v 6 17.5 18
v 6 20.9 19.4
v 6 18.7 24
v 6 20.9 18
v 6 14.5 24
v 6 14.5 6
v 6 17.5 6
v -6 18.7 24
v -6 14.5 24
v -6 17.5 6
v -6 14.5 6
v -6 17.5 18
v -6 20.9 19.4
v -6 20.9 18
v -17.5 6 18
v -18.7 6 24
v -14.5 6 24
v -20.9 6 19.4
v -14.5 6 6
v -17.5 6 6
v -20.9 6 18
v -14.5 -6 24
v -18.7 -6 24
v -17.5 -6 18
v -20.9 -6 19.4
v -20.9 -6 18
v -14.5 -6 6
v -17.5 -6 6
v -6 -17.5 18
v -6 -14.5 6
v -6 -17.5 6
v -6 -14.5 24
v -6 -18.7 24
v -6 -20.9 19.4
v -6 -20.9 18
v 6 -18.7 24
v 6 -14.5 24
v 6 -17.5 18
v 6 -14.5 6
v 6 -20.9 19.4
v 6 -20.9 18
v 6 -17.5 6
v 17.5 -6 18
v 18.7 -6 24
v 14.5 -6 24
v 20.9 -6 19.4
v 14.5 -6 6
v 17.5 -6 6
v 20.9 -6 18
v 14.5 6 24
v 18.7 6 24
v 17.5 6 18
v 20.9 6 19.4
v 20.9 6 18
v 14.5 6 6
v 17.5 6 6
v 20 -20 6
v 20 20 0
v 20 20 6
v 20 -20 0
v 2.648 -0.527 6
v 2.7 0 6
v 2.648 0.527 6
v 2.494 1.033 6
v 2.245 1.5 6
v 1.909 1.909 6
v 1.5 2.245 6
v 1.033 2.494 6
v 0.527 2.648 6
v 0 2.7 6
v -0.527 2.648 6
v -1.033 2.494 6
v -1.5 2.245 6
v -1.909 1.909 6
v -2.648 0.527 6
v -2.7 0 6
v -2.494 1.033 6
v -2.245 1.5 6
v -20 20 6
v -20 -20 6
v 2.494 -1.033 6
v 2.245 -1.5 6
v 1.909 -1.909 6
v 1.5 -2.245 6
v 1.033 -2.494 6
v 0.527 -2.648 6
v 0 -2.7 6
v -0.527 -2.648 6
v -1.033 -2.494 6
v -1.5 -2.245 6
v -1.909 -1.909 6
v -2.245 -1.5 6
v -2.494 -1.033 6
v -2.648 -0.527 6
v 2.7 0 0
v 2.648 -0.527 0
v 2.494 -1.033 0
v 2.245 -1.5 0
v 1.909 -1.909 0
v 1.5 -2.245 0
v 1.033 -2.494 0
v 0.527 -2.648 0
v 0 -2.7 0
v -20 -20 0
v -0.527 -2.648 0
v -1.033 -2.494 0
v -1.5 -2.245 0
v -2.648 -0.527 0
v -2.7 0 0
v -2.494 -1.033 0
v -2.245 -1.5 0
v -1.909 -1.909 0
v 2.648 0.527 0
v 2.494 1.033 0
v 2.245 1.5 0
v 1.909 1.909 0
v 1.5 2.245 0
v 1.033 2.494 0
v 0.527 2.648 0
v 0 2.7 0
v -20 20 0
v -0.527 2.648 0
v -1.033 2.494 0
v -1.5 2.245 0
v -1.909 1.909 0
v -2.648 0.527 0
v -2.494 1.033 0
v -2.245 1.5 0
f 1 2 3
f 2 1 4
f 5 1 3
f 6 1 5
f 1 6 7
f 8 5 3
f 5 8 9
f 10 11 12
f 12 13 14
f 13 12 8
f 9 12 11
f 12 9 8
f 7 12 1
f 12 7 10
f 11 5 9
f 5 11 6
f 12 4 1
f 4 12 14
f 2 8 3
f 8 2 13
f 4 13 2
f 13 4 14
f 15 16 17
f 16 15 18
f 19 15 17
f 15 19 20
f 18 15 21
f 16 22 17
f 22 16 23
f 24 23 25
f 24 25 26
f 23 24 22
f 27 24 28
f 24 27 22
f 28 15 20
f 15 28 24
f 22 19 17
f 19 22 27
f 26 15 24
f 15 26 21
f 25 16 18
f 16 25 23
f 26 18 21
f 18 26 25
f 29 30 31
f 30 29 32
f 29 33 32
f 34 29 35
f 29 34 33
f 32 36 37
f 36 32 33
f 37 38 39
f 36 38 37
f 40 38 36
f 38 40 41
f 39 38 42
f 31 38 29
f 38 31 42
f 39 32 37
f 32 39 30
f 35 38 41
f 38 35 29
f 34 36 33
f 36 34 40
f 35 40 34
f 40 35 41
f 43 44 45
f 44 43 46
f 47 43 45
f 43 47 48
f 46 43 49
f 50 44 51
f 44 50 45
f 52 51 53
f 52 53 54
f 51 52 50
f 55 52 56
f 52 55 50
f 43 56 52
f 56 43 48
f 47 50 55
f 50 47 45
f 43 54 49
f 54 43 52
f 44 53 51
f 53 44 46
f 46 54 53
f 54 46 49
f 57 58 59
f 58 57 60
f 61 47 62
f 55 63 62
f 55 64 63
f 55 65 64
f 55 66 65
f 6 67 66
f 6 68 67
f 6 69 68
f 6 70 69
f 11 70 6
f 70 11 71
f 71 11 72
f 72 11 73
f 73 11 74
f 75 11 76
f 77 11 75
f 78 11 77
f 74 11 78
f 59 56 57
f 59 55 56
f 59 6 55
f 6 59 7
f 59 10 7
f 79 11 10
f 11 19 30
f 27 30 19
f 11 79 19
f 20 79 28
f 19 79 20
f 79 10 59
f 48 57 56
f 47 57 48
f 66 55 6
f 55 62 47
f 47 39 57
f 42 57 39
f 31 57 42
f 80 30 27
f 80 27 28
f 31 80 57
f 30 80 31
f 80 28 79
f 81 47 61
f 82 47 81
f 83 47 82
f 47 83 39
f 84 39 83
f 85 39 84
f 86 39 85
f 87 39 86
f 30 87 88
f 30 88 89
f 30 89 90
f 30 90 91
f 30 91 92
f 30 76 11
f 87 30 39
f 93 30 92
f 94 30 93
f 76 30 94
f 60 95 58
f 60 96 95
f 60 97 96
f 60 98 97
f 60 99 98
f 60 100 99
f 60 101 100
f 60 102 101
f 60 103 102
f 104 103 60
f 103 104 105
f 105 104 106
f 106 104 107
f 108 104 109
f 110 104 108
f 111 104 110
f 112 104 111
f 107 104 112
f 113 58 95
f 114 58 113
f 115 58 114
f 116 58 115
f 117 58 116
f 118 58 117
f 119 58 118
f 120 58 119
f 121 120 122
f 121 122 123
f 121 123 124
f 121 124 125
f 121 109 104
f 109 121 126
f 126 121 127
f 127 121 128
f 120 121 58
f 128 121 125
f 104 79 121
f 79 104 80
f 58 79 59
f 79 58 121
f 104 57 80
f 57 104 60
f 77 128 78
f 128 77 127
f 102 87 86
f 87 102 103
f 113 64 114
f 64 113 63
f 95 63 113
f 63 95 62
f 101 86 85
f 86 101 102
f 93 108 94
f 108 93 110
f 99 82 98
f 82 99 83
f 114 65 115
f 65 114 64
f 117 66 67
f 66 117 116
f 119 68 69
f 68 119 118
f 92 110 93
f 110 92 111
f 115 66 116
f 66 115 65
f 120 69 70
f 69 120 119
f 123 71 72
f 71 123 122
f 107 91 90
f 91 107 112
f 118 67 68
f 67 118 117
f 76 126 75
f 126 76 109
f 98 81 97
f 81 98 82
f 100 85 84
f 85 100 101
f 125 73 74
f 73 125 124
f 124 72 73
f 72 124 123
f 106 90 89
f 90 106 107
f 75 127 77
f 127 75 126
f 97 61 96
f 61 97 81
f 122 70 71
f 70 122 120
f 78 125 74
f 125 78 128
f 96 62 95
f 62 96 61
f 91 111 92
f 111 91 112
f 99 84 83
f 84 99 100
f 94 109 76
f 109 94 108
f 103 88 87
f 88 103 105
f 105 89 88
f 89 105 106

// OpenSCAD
$fn = 32;

// ----------------------------------------------------------------------
// Snap-fit latch: 4 arms, 18 mm tall, 3.6 mm undercut hooks
// ----------------------------------------------------------------------

// --- parameters (mm) ---
base_d = 40;              // base plate depth
base_h = 6;               // base plate thickness
span = 32;                // distance between opposite arms
arm_t = 3;                // arm thickness
arm_d = 12;               // arm width
height = 18;              // free arm length
head_len = 3.6;           // hook reach
head_h = 6;               // hook height
lead = 1.4;               // lead-in ramp thickness
bore_d = 5.4;             // base fixing bore
top_z = 24;               // height of the arm tips above the base

arms = 4;

difference() {
  union() {
    /* base plate, centred on the arm ring */
    translate([-20, -20, 0]) cube([base_d, base_d, base_h]);
    for (a = [0 : 360 / arms : 359]) rotate([0, 0, a]) {
    /* arm, sunk 0.5 mm into the base */
    translate([-arm_d / 2, span / 2 - arm_t / 2, base_h - 0.5]) cube([arm_d, arm_t, height + 0.5]);
    /* hook: a convex hull of a tall inner block and a thin outer lip
       gives a flat undercut below and a lead-in ramp on top */
    hull() {
      translate([-arm_d / 2, span / 2 + arm_t / 2 - 0.6, top_z - head_h]) cube([arm_d, lead + 0.4, head_h]);
      translate([-arm_d / 2, span / 2 + arm_t / 2 - 0.2, top_z - head_h]) cube([arm_d, head_len, lead]);
    }
    }
  }
  translate([0, 0, -2.5]) cylinder(h = base_h + 5, d = bore_d);
}
